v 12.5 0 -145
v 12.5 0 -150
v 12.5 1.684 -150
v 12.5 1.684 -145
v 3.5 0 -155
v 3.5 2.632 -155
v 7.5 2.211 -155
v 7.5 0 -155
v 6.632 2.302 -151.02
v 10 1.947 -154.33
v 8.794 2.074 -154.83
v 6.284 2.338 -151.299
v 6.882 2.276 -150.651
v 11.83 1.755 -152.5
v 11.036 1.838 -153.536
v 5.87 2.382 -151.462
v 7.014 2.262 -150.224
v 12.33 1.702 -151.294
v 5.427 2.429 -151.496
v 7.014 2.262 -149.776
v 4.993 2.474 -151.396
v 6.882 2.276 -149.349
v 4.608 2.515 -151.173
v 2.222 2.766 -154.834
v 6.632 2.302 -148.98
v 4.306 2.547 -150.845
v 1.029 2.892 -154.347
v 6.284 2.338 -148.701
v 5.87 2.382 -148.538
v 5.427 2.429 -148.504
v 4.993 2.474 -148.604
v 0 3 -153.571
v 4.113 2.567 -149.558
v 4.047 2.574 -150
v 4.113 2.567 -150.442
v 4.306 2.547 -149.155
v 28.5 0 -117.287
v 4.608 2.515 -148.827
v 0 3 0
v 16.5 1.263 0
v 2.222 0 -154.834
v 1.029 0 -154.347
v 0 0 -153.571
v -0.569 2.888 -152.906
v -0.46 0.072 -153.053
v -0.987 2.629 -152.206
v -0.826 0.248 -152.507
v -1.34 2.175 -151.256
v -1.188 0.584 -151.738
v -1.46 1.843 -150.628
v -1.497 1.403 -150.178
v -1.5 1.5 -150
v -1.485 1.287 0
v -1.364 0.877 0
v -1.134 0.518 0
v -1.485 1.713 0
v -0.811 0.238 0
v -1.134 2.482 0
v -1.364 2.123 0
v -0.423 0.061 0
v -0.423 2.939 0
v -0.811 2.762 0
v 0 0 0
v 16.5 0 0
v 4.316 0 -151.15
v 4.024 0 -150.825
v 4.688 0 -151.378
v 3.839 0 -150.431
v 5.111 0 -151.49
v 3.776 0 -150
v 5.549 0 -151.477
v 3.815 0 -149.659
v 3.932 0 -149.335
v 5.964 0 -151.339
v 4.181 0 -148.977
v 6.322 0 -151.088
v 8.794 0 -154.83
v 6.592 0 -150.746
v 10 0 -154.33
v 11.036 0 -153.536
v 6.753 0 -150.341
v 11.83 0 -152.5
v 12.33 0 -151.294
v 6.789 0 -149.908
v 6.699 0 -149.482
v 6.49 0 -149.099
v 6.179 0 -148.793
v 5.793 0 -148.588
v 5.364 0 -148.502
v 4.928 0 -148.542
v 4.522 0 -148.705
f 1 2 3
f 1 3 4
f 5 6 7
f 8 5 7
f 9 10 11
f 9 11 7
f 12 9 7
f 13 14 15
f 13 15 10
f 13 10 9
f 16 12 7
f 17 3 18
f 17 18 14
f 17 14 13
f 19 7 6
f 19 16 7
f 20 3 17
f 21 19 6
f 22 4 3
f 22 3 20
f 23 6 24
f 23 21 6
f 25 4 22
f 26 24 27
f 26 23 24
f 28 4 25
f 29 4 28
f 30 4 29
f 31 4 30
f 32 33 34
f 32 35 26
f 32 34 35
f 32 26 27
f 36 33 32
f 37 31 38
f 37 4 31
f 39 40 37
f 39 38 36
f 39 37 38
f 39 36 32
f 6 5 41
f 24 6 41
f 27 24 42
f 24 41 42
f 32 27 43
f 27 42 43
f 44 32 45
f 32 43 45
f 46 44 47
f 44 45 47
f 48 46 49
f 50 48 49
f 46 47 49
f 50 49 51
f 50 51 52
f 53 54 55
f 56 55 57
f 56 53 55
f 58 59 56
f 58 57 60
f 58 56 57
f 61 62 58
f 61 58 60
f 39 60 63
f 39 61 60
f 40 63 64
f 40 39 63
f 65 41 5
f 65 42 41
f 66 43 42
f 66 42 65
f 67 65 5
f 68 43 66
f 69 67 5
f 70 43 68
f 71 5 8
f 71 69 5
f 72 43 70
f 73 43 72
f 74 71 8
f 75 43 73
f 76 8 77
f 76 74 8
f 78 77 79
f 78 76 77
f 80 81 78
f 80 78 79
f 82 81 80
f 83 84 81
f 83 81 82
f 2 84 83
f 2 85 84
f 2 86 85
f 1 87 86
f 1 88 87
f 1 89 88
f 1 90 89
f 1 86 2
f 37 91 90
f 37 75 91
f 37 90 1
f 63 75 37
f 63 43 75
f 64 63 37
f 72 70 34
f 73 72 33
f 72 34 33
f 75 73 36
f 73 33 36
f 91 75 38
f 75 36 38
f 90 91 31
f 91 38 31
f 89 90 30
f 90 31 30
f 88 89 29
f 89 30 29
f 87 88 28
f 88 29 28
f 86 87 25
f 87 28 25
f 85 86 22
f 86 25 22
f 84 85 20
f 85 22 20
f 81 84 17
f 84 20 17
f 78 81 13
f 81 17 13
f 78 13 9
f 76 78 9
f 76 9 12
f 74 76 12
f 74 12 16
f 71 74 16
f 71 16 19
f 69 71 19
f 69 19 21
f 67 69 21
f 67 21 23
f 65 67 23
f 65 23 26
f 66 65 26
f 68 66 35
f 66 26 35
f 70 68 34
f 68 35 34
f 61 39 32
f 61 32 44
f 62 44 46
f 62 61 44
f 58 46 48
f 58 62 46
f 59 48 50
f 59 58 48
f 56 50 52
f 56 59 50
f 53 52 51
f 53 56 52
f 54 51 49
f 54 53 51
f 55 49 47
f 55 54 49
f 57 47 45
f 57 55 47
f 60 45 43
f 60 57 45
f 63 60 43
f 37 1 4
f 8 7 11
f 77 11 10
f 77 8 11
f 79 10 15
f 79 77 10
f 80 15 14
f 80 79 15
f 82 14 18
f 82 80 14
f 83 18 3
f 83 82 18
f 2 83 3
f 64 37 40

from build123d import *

# Parameters (mm, degrees)
SALIENTE_EXTRUIR1_DEPTH = 155
CORTAR_EXTRUIR6_DEPTH   = 155
CROQUIS5_R              = 1.5
CORTAR_EXTRUIR9_DEPTH   = 155


with BuildPart() as part:
    # Croquis1 → Saliente-Extruir1 (new body)
    with BuildSketch(Plane.XY):
        with BuildLine():
            Line((0, 0), (28.5, 0))
            Line((28.5, 0), (0, 3))
            ThreePointArc((0, 3), (-1.5, 1.5), (0, 0))
        make_face()
    extrude(amount=-SALIENTE_EXTRUIR1_DEPTH)

    # Croquis3 → Cortar-Extruir6 (cut)
    with BuildSketch(Plane(origin=(0, 0, 0), x_dir=(1, 0, 0), z_dir=(0, 1, 0))):
        Polygon((28.5, 0), (28.5, 117.287187079), (16.5, 0), align=None)
        with BuildLine():
            ThreePointArc((7.5, 155), (11.035533906, 153.535533906), (12.5, 150))
            Line((12.5, 150), (12.5, 145))
            Line((12.5, 145), (28.5, 117.287187079))
            Line((28.5, 117.287187079), (28.5, 155))
            Line((28.5, 155), (7.5, 155))
        make_face()
        with BuildLine():
            ThreePointArc((3.5, 155), (-0.035533906, 153.535533906), (-1.5, 150))
            Line((-1.5, 150), (-1.5, 155))
            Line((-1.5, 155), (3.5, 155))
        make_face()
    extrude(amount=CORTAR_EXTRUIR6_DEPTH, mode=Mode.SUBTRACT)

    # Croquis5 → Cortar-Extruir9 (cut)
    with BuildSketch(Plane(origin=(0.312328767, 2.967123288, 0), x_dir=(0.9945054529214061, -0.10468478451804268, 0), z_dir=(0.10468478451804267, 0.994505452921406, 0))):
        with Locations(Location((5.255006945, 150, 0), (0, 0, 180))):
            Circle(CROQUIS5_R)
    extrude(amount=-CORTAR_EXTRUIR9_DEPTH, mode=Mode.SUBTRACT)


solid = part.part
